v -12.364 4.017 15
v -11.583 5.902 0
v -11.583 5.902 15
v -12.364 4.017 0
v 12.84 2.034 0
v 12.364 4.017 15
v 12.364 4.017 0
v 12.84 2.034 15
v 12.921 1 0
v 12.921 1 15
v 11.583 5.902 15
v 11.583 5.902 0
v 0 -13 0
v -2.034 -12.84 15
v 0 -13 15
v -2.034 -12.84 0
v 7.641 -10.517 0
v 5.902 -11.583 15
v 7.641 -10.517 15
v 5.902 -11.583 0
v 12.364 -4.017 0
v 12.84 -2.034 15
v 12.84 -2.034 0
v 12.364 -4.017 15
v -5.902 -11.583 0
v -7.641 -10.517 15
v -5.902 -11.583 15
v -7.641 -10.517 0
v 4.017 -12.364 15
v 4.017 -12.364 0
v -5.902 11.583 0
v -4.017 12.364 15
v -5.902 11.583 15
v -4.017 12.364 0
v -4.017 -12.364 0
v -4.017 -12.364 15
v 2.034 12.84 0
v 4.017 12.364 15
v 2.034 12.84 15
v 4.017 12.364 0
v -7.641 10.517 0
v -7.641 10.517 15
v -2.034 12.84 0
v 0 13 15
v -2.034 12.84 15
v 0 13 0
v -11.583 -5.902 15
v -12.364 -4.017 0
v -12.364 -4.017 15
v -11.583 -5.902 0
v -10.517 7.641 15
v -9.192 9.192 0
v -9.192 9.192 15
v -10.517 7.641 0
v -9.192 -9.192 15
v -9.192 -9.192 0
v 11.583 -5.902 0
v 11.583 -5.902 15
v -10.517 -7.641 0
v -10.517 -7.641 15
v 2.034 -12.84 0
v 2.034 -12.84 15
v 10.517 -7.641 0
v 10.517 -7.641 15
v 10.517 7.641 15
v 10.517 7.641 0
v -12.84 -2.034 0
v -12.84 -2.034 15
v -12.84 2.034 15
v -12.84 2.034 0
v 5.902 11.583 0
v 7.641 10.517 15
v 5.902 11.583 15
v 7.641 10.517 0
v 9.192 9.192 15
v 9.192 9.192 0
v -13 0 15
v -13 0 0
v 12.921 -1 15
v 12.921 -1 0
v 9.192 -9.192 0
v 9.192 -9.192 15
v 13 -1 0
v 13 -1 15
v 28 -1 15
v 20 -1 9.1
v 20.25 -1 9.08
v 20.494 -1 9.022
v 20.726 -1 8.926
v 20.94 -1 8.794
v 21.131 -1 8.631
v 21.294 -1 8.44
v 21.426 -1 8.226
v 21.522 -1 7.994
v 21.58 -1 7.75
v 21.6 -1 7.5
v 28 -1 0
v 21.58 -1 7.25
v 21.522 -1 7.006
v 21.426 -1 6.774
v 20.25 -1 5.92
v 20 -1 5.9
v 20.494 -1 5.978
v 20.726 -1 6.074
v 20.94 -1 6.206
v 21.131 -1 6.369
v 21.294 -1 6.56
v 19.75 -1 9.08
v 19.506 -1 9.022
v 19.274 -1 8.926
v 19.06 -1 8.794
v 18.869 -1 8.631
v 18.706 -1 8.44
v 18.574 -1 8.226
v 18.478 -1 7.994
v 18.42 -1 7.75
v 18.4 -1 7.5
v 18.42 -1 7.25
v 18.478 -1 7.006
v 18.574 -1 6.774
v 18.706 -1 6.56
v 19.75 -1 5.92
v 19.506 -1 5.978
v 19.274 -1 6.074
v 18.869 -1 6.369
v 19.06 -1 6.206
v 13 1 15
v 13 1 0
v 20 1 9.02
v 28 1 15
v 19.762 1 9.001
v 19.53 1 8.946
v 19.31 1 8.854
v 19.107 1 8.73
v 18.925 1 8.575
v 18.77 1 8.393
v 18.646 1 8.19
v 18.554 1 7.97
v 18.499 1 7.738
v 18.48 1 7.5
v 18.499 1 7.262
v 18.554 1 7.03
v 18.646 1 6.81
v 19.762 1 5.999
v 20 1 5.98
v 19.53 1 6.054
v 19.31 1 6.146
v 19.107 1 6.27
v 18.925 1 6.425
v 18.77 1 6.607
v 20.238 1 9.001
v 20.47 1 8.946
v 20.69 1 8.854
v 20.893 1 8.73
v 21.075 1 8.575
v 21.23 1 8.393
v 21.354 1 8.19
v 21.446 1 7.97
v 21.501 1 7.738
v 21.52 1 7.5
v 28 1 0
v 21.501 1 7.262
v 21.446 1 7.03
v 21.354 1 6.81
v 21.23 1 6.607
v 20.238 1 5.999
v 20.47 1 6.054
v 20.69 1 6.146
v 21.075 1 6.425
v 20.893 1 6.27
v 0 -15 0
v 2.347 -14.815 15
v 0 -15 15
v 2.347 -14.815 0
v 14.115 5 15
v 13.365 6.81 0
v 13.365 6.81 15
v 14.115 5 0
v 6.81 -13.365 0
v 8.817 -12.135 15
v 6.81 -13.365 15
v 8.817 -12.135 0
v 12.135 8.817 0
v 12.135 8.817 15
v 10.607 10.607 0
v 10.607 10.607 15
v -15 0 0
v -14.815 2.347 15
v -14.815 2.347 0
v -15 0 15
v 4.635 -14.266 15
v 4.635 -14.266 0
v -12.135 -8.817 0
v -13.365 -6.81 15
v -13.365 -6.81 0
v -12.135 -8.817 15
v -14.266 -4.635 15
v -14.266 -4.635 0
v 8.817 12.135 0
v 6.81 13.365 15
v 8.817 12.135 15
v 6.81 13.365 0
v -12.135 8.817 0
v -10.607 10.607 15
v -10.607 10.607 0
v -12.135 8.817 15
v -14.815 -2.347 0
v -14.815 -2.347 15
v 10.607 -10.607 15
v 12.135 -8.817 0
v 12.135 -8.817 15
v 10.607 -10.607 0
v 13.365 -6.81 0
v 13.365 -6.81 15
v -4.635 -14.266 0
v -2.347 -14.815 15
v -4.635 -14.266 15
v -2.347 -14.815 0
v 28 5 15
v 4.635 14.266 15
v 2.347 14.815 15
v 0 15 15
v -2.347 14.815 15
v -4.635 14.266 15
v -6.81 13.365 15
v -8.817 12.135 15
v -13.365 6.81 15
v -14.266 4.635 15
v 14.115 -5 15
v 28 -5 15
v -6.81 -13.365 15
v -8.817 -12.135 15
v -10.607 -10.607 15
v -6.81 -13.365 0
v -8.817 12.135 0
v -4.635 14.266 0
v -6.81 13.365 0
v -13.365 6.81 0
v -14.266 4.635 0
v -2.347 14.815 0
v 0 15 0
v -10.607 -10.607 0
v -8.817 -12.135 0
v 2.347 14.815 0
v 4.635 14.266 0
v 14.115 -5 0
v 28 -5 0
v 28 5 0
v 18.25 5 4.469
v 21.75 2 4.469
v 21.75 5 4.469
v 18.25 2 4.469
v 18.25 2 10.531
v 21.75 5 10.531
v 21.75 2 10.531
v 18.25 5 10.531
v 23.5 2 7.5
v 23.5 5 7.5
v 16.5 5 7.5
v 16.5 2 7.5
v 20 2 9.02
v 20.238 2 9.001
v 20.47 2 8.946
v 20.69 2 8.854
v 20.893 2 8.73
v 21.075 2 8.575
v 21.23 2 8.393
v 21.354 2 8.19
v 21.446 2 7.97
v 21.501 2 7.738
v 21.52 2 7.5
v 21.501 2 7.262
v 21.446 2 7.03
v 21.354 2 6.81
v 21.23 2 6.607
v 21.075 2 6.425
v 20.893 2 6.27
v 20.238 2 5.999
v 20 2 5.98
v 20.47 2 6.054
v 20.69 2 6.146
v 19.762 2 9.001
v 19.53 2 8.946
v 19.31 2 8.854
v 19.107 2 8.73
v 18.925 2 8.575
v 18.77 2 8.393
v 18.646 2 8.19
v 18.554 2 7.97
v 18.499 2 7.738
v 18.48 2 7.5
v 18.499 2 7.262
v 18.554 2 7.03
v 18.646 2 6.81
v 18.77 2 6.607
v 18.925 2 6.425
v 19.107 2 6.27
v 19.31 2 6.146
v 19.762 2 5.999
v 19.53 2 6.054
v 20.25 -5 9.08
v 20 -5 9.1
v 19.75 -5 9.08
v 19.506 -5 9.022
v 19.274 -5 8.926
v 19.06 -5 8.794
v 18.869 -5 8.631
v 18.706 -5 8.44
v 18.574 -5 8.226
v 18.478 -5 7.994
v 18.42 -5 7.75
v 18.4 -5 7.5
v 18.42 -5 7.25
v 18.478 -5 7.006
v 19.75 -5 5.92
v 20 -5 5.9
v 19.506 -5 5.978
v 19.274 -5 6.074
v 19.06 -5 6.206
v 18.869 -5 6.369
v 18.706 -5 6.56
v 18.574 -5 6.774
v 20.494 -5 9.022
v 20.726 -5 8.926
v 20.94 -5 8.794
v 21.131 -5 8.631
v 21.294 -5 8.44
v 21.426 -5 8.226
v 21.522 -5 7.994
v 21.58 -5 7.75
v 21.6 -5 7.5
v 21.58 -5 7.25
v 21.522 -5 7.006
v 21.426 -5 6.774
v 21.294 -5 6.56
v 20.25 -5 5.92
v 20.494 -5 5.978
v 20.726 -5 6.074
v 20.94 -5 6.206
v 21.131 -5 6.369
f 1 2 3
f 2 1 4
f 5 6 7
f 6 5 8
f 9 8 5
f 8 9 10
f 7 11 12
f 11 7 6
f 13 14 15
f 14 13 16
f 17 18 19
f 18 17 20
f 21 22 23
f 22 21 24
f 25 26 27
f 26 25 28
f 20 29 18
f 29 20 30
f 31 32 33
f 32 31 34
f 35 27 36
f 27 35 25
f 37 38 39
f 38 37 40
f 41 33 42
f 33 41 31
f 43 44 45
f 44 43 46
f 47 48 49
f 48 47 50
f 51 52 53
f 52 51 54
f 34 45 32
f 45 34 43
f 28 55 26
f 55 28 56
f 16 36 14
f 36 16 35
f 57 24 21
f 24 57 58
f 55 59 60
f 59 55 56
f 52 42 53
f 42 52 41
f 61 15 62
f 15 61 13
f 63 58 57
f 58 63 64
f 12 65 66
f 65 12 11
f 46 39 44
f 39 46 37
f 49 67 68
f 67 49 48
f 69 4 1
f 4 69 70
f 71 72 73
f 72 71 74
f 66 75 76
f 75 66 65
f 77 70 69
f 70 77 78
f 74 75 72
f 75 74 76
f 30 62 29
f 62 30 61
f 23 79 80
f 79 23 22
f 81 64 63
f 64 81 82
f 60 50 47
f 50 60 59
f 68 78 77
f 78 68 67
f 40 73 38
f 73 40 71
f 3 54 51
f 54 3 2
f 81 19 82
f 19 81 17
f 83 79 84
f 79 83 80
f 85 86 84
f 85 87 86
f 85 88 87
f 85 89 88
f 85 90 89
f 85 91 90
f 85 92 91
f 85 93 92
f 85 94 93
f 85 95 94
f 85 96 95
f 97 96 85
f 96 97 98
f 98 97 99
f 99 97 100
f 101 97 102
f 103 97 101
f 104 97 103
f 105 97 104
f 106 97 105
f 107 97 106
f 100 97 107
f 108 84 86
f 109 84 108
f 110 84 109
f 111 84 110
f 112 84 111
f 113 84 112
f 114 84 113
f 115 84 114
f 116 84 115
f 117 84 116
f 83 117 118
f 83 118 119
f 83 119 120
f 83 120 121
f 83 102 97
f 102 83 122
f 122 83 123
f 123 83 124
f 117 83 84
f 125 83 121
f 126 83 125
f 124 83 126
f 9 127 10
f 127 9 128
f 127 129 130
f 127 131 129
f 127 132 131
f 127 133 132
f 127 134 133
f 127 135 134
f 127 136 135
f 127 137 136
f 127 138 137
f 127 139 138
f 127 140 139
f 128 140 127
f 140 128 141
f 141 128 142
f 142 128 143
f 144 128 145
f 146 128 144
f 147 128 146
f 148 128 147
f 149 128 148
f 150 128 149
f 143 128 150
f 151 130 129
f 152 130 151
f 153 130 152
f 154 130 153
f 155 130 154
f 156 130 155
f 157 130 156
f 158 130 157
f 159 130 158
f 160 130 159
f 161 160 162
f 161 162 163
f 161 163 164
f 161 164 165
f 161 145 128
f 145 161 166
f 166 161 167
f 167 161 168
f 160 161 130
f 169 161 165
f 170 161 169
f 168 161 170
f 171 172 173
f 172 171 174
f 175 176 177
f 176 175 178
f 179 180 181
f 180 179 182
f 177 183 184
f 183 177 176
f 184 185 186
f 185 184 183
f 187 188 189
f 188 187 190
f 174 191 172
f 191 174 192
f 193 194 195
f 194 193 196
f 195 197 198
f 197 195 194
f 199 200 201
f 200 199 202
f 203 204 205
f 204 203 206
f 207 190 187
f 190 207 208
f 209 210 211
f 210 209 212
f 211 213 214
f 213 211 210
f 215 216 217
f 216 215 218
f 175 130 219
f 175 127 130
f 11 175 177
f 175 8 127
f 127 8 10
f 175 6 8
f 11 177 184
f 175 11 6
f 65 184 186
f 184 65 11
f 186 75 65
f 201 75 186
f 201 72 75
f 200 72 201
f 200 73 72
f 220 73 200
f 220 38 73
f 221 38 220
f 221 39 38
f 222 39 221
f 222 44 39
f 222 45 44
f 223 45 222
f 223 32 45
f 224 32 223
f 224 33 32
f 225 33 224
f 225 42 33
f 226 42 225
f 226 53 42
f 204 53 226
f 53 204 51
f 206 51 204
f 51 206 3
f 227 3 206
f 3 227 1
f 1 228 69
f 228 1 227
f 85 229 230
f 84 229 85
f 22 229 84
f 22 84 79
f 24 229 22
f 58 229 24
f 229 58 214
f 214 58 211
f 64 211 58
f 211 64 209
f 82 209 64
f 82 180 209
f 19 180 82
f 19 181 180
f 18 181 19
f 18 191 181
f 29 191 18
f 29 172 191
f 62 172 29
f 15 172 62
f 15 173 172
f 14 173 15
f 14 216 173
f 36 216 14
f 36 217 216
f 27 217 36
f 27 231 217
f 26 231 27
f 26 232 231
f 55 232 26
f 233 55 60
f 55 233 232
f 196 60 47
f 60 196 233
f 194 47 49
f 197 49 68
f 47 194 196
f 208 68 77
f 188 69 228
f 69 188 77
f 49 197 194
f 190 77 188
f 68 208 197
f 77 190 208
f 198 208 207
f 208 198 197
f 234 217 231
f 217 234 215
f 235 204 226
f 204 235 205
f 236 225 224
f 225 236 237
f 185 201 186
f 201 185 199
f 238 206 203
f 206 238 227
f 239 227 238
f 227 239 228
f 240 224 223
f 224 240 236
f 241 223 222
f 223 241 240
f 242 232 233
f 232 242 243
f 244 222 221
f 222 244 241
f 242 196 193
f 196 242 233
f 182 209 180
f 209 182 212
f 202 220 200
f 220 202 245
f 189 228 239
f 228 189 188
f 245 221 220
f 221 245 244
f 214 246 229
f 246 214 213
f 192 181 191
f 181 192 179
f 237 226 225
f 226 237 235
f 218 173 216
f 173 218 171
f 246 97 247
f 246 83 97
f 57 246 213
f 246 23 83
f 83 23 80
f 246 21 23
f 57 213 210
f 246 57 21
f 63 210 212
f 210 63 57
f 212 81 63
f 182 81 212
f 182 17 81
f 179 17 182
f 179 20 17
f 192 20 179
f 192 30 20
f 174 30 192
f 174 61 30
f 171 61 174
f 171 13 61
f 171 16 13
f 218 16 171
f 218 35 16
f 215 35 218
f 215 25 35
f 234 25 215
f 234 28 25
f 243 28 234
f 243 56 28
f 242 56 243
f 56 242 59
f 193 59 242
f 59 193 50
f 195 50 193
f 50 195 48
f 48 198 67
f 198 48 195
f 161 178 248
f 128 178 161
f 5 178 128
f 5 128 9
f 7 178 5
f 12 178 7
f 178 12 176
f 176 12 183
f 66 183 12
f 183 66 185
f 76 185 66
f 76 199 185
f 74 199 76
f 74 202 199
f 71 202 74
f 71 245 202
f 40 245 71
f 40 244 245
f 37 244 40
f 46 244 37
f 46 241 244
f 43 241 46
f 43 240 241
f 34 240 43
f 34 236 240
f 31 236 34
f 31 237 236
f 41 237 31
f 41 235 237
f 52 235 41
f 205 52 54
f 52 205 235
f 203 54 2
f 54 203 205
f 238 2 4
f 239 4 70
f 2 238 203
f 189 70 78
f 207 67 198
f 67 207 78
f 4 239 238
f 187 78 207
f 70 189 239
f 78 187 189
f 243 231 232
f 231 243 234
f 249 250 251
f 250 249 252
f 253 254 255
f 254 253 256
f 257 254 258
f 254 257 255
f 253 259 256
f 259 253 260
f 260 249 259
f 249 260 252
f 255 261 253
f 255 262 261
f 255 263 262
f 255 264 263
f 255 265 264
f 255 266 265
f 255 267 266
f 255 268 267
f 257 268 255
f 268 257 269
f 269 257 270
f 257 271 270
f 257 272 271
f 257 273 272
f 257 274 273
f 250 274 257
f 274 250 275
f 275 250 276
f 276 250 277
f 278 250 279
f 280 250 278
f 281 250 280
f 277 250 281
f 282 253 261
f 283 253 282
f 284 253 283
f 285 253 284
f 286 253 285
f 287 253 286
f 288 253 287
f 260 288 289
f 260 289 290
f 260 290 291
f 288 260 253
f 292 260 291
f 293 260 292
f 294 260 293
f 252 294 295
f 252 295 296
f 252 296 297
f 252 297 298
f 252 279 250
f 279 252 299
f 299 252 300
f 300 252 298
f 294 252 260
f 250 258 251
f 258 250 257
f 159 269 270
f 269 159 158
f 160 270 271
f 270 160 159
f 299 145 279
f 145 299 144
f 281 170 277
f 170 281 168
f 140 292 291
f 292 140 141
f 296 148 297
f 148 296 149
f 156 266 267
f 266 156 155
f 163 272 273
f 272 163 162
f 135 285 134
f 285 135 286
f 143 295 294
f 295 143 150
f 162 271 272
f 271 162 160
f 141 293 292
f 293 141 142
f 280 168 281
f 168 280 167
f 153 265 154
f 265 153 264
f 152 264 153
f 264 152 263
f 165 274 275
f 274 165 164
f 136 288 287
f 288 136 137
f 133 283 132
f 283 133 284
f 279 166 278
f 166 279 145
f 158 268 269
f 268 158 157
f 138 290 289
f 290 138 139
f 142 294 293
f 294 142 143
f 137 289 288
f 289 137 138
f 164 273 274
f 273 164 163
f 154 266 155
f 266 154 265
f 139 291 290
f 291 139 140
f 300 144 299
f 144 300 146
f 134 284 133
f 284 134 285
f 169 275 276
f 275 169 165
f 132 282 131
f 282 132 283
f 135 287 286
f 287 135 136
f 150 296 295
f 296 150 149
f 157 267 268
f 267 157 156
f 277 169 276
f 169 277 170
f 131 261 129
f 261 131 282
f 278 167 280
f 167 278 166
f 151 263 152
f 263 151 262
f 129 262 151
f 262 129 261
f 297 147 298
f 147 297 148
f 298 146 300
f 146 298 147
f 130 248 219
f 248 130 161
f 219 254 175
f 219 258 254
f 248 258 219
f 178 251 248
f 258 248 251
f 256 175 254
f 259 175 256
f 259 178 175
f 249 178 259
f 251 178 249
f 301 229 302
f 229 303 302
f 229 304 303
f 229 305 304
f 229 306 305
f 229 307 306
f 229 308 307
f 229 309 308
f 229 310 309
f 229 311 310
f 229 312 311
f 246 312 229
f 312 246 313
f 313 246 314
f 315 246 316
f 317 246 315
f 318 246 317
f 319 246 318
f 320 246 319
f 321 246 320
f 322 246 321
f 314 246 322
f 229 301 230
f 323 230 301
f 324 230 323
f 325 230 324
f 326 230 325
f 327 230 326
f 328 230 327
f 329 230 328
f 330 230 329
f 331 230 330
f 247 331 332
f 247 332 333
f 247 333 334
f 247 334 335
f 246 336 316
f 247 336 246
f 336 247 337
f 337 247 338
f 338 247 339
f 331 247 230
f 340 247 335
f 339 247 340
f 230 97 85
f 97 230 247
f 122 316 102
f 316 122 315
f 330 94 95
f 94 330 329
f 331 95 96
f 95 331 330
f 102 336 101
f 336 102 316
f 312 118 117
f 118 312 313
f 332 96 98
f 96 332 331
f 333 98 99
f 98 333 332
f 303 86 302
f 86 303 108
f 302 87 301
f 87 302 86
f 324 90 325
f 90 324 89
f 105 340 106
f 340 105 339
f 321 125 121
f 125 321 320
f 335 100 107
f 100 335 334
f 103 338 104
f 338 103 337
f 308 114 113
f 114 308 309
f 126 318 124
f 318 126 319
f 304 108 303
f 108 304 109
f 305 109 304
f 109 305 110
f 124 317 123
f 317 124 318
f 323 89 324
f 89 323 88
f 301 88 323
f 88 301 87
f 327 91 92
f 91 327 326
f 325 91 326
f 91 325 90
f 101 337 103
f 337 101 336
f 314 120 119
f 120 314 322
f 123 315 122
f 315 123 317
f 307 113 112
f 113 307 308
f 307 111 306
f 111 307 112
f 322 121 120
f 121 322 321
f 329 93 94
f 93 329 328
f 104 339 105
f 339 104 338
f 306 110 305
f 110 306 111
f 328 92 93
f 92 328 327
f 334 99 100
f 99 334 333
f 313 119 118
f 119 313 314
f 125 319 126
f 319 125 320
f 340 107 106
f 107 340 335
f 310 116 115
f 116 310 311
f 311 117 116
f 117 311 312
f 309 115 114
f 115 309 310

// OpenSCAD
$fn=40;
//inner width
//iw = 26;
iw = 30;
//thickness
th = 2;
//width
w = 15;

//corner to corner hex nut = 6.01
//rad = 3.1;
rad = 3.5;

difference()
{

cylinder(h=w, r=iw/2);
translate([0,0,-1])


union(){
cylinder(h=w*2, r=iw/2-th);


translate([iw/2-th*2,1,0])
rotate([90,0,0])
cube([w*2,w*2,2]);
}
}



difference()
{



translate([iw/2-th,5,0])
rotate([90,0,0])
cube([w,w,th*2]);


union()
{

translate([iw/2+5,6,w/2])
rotate([90,0,0])
cylinder(r=rad,h=4, $fn=6);


translate([iw/2+5,7,w/2])
rotate([90,0,0])
cylinder(r=1.52,h=22);
}
}


difference()
{

translate([iw/2-th,-1,0])
rotate([90,0,0])
cube([w,w,th*2]);


translate([iw/2+5,7,w/2])
rotate([90,0,0])
cylinder(r=1.6,h=22);
}
